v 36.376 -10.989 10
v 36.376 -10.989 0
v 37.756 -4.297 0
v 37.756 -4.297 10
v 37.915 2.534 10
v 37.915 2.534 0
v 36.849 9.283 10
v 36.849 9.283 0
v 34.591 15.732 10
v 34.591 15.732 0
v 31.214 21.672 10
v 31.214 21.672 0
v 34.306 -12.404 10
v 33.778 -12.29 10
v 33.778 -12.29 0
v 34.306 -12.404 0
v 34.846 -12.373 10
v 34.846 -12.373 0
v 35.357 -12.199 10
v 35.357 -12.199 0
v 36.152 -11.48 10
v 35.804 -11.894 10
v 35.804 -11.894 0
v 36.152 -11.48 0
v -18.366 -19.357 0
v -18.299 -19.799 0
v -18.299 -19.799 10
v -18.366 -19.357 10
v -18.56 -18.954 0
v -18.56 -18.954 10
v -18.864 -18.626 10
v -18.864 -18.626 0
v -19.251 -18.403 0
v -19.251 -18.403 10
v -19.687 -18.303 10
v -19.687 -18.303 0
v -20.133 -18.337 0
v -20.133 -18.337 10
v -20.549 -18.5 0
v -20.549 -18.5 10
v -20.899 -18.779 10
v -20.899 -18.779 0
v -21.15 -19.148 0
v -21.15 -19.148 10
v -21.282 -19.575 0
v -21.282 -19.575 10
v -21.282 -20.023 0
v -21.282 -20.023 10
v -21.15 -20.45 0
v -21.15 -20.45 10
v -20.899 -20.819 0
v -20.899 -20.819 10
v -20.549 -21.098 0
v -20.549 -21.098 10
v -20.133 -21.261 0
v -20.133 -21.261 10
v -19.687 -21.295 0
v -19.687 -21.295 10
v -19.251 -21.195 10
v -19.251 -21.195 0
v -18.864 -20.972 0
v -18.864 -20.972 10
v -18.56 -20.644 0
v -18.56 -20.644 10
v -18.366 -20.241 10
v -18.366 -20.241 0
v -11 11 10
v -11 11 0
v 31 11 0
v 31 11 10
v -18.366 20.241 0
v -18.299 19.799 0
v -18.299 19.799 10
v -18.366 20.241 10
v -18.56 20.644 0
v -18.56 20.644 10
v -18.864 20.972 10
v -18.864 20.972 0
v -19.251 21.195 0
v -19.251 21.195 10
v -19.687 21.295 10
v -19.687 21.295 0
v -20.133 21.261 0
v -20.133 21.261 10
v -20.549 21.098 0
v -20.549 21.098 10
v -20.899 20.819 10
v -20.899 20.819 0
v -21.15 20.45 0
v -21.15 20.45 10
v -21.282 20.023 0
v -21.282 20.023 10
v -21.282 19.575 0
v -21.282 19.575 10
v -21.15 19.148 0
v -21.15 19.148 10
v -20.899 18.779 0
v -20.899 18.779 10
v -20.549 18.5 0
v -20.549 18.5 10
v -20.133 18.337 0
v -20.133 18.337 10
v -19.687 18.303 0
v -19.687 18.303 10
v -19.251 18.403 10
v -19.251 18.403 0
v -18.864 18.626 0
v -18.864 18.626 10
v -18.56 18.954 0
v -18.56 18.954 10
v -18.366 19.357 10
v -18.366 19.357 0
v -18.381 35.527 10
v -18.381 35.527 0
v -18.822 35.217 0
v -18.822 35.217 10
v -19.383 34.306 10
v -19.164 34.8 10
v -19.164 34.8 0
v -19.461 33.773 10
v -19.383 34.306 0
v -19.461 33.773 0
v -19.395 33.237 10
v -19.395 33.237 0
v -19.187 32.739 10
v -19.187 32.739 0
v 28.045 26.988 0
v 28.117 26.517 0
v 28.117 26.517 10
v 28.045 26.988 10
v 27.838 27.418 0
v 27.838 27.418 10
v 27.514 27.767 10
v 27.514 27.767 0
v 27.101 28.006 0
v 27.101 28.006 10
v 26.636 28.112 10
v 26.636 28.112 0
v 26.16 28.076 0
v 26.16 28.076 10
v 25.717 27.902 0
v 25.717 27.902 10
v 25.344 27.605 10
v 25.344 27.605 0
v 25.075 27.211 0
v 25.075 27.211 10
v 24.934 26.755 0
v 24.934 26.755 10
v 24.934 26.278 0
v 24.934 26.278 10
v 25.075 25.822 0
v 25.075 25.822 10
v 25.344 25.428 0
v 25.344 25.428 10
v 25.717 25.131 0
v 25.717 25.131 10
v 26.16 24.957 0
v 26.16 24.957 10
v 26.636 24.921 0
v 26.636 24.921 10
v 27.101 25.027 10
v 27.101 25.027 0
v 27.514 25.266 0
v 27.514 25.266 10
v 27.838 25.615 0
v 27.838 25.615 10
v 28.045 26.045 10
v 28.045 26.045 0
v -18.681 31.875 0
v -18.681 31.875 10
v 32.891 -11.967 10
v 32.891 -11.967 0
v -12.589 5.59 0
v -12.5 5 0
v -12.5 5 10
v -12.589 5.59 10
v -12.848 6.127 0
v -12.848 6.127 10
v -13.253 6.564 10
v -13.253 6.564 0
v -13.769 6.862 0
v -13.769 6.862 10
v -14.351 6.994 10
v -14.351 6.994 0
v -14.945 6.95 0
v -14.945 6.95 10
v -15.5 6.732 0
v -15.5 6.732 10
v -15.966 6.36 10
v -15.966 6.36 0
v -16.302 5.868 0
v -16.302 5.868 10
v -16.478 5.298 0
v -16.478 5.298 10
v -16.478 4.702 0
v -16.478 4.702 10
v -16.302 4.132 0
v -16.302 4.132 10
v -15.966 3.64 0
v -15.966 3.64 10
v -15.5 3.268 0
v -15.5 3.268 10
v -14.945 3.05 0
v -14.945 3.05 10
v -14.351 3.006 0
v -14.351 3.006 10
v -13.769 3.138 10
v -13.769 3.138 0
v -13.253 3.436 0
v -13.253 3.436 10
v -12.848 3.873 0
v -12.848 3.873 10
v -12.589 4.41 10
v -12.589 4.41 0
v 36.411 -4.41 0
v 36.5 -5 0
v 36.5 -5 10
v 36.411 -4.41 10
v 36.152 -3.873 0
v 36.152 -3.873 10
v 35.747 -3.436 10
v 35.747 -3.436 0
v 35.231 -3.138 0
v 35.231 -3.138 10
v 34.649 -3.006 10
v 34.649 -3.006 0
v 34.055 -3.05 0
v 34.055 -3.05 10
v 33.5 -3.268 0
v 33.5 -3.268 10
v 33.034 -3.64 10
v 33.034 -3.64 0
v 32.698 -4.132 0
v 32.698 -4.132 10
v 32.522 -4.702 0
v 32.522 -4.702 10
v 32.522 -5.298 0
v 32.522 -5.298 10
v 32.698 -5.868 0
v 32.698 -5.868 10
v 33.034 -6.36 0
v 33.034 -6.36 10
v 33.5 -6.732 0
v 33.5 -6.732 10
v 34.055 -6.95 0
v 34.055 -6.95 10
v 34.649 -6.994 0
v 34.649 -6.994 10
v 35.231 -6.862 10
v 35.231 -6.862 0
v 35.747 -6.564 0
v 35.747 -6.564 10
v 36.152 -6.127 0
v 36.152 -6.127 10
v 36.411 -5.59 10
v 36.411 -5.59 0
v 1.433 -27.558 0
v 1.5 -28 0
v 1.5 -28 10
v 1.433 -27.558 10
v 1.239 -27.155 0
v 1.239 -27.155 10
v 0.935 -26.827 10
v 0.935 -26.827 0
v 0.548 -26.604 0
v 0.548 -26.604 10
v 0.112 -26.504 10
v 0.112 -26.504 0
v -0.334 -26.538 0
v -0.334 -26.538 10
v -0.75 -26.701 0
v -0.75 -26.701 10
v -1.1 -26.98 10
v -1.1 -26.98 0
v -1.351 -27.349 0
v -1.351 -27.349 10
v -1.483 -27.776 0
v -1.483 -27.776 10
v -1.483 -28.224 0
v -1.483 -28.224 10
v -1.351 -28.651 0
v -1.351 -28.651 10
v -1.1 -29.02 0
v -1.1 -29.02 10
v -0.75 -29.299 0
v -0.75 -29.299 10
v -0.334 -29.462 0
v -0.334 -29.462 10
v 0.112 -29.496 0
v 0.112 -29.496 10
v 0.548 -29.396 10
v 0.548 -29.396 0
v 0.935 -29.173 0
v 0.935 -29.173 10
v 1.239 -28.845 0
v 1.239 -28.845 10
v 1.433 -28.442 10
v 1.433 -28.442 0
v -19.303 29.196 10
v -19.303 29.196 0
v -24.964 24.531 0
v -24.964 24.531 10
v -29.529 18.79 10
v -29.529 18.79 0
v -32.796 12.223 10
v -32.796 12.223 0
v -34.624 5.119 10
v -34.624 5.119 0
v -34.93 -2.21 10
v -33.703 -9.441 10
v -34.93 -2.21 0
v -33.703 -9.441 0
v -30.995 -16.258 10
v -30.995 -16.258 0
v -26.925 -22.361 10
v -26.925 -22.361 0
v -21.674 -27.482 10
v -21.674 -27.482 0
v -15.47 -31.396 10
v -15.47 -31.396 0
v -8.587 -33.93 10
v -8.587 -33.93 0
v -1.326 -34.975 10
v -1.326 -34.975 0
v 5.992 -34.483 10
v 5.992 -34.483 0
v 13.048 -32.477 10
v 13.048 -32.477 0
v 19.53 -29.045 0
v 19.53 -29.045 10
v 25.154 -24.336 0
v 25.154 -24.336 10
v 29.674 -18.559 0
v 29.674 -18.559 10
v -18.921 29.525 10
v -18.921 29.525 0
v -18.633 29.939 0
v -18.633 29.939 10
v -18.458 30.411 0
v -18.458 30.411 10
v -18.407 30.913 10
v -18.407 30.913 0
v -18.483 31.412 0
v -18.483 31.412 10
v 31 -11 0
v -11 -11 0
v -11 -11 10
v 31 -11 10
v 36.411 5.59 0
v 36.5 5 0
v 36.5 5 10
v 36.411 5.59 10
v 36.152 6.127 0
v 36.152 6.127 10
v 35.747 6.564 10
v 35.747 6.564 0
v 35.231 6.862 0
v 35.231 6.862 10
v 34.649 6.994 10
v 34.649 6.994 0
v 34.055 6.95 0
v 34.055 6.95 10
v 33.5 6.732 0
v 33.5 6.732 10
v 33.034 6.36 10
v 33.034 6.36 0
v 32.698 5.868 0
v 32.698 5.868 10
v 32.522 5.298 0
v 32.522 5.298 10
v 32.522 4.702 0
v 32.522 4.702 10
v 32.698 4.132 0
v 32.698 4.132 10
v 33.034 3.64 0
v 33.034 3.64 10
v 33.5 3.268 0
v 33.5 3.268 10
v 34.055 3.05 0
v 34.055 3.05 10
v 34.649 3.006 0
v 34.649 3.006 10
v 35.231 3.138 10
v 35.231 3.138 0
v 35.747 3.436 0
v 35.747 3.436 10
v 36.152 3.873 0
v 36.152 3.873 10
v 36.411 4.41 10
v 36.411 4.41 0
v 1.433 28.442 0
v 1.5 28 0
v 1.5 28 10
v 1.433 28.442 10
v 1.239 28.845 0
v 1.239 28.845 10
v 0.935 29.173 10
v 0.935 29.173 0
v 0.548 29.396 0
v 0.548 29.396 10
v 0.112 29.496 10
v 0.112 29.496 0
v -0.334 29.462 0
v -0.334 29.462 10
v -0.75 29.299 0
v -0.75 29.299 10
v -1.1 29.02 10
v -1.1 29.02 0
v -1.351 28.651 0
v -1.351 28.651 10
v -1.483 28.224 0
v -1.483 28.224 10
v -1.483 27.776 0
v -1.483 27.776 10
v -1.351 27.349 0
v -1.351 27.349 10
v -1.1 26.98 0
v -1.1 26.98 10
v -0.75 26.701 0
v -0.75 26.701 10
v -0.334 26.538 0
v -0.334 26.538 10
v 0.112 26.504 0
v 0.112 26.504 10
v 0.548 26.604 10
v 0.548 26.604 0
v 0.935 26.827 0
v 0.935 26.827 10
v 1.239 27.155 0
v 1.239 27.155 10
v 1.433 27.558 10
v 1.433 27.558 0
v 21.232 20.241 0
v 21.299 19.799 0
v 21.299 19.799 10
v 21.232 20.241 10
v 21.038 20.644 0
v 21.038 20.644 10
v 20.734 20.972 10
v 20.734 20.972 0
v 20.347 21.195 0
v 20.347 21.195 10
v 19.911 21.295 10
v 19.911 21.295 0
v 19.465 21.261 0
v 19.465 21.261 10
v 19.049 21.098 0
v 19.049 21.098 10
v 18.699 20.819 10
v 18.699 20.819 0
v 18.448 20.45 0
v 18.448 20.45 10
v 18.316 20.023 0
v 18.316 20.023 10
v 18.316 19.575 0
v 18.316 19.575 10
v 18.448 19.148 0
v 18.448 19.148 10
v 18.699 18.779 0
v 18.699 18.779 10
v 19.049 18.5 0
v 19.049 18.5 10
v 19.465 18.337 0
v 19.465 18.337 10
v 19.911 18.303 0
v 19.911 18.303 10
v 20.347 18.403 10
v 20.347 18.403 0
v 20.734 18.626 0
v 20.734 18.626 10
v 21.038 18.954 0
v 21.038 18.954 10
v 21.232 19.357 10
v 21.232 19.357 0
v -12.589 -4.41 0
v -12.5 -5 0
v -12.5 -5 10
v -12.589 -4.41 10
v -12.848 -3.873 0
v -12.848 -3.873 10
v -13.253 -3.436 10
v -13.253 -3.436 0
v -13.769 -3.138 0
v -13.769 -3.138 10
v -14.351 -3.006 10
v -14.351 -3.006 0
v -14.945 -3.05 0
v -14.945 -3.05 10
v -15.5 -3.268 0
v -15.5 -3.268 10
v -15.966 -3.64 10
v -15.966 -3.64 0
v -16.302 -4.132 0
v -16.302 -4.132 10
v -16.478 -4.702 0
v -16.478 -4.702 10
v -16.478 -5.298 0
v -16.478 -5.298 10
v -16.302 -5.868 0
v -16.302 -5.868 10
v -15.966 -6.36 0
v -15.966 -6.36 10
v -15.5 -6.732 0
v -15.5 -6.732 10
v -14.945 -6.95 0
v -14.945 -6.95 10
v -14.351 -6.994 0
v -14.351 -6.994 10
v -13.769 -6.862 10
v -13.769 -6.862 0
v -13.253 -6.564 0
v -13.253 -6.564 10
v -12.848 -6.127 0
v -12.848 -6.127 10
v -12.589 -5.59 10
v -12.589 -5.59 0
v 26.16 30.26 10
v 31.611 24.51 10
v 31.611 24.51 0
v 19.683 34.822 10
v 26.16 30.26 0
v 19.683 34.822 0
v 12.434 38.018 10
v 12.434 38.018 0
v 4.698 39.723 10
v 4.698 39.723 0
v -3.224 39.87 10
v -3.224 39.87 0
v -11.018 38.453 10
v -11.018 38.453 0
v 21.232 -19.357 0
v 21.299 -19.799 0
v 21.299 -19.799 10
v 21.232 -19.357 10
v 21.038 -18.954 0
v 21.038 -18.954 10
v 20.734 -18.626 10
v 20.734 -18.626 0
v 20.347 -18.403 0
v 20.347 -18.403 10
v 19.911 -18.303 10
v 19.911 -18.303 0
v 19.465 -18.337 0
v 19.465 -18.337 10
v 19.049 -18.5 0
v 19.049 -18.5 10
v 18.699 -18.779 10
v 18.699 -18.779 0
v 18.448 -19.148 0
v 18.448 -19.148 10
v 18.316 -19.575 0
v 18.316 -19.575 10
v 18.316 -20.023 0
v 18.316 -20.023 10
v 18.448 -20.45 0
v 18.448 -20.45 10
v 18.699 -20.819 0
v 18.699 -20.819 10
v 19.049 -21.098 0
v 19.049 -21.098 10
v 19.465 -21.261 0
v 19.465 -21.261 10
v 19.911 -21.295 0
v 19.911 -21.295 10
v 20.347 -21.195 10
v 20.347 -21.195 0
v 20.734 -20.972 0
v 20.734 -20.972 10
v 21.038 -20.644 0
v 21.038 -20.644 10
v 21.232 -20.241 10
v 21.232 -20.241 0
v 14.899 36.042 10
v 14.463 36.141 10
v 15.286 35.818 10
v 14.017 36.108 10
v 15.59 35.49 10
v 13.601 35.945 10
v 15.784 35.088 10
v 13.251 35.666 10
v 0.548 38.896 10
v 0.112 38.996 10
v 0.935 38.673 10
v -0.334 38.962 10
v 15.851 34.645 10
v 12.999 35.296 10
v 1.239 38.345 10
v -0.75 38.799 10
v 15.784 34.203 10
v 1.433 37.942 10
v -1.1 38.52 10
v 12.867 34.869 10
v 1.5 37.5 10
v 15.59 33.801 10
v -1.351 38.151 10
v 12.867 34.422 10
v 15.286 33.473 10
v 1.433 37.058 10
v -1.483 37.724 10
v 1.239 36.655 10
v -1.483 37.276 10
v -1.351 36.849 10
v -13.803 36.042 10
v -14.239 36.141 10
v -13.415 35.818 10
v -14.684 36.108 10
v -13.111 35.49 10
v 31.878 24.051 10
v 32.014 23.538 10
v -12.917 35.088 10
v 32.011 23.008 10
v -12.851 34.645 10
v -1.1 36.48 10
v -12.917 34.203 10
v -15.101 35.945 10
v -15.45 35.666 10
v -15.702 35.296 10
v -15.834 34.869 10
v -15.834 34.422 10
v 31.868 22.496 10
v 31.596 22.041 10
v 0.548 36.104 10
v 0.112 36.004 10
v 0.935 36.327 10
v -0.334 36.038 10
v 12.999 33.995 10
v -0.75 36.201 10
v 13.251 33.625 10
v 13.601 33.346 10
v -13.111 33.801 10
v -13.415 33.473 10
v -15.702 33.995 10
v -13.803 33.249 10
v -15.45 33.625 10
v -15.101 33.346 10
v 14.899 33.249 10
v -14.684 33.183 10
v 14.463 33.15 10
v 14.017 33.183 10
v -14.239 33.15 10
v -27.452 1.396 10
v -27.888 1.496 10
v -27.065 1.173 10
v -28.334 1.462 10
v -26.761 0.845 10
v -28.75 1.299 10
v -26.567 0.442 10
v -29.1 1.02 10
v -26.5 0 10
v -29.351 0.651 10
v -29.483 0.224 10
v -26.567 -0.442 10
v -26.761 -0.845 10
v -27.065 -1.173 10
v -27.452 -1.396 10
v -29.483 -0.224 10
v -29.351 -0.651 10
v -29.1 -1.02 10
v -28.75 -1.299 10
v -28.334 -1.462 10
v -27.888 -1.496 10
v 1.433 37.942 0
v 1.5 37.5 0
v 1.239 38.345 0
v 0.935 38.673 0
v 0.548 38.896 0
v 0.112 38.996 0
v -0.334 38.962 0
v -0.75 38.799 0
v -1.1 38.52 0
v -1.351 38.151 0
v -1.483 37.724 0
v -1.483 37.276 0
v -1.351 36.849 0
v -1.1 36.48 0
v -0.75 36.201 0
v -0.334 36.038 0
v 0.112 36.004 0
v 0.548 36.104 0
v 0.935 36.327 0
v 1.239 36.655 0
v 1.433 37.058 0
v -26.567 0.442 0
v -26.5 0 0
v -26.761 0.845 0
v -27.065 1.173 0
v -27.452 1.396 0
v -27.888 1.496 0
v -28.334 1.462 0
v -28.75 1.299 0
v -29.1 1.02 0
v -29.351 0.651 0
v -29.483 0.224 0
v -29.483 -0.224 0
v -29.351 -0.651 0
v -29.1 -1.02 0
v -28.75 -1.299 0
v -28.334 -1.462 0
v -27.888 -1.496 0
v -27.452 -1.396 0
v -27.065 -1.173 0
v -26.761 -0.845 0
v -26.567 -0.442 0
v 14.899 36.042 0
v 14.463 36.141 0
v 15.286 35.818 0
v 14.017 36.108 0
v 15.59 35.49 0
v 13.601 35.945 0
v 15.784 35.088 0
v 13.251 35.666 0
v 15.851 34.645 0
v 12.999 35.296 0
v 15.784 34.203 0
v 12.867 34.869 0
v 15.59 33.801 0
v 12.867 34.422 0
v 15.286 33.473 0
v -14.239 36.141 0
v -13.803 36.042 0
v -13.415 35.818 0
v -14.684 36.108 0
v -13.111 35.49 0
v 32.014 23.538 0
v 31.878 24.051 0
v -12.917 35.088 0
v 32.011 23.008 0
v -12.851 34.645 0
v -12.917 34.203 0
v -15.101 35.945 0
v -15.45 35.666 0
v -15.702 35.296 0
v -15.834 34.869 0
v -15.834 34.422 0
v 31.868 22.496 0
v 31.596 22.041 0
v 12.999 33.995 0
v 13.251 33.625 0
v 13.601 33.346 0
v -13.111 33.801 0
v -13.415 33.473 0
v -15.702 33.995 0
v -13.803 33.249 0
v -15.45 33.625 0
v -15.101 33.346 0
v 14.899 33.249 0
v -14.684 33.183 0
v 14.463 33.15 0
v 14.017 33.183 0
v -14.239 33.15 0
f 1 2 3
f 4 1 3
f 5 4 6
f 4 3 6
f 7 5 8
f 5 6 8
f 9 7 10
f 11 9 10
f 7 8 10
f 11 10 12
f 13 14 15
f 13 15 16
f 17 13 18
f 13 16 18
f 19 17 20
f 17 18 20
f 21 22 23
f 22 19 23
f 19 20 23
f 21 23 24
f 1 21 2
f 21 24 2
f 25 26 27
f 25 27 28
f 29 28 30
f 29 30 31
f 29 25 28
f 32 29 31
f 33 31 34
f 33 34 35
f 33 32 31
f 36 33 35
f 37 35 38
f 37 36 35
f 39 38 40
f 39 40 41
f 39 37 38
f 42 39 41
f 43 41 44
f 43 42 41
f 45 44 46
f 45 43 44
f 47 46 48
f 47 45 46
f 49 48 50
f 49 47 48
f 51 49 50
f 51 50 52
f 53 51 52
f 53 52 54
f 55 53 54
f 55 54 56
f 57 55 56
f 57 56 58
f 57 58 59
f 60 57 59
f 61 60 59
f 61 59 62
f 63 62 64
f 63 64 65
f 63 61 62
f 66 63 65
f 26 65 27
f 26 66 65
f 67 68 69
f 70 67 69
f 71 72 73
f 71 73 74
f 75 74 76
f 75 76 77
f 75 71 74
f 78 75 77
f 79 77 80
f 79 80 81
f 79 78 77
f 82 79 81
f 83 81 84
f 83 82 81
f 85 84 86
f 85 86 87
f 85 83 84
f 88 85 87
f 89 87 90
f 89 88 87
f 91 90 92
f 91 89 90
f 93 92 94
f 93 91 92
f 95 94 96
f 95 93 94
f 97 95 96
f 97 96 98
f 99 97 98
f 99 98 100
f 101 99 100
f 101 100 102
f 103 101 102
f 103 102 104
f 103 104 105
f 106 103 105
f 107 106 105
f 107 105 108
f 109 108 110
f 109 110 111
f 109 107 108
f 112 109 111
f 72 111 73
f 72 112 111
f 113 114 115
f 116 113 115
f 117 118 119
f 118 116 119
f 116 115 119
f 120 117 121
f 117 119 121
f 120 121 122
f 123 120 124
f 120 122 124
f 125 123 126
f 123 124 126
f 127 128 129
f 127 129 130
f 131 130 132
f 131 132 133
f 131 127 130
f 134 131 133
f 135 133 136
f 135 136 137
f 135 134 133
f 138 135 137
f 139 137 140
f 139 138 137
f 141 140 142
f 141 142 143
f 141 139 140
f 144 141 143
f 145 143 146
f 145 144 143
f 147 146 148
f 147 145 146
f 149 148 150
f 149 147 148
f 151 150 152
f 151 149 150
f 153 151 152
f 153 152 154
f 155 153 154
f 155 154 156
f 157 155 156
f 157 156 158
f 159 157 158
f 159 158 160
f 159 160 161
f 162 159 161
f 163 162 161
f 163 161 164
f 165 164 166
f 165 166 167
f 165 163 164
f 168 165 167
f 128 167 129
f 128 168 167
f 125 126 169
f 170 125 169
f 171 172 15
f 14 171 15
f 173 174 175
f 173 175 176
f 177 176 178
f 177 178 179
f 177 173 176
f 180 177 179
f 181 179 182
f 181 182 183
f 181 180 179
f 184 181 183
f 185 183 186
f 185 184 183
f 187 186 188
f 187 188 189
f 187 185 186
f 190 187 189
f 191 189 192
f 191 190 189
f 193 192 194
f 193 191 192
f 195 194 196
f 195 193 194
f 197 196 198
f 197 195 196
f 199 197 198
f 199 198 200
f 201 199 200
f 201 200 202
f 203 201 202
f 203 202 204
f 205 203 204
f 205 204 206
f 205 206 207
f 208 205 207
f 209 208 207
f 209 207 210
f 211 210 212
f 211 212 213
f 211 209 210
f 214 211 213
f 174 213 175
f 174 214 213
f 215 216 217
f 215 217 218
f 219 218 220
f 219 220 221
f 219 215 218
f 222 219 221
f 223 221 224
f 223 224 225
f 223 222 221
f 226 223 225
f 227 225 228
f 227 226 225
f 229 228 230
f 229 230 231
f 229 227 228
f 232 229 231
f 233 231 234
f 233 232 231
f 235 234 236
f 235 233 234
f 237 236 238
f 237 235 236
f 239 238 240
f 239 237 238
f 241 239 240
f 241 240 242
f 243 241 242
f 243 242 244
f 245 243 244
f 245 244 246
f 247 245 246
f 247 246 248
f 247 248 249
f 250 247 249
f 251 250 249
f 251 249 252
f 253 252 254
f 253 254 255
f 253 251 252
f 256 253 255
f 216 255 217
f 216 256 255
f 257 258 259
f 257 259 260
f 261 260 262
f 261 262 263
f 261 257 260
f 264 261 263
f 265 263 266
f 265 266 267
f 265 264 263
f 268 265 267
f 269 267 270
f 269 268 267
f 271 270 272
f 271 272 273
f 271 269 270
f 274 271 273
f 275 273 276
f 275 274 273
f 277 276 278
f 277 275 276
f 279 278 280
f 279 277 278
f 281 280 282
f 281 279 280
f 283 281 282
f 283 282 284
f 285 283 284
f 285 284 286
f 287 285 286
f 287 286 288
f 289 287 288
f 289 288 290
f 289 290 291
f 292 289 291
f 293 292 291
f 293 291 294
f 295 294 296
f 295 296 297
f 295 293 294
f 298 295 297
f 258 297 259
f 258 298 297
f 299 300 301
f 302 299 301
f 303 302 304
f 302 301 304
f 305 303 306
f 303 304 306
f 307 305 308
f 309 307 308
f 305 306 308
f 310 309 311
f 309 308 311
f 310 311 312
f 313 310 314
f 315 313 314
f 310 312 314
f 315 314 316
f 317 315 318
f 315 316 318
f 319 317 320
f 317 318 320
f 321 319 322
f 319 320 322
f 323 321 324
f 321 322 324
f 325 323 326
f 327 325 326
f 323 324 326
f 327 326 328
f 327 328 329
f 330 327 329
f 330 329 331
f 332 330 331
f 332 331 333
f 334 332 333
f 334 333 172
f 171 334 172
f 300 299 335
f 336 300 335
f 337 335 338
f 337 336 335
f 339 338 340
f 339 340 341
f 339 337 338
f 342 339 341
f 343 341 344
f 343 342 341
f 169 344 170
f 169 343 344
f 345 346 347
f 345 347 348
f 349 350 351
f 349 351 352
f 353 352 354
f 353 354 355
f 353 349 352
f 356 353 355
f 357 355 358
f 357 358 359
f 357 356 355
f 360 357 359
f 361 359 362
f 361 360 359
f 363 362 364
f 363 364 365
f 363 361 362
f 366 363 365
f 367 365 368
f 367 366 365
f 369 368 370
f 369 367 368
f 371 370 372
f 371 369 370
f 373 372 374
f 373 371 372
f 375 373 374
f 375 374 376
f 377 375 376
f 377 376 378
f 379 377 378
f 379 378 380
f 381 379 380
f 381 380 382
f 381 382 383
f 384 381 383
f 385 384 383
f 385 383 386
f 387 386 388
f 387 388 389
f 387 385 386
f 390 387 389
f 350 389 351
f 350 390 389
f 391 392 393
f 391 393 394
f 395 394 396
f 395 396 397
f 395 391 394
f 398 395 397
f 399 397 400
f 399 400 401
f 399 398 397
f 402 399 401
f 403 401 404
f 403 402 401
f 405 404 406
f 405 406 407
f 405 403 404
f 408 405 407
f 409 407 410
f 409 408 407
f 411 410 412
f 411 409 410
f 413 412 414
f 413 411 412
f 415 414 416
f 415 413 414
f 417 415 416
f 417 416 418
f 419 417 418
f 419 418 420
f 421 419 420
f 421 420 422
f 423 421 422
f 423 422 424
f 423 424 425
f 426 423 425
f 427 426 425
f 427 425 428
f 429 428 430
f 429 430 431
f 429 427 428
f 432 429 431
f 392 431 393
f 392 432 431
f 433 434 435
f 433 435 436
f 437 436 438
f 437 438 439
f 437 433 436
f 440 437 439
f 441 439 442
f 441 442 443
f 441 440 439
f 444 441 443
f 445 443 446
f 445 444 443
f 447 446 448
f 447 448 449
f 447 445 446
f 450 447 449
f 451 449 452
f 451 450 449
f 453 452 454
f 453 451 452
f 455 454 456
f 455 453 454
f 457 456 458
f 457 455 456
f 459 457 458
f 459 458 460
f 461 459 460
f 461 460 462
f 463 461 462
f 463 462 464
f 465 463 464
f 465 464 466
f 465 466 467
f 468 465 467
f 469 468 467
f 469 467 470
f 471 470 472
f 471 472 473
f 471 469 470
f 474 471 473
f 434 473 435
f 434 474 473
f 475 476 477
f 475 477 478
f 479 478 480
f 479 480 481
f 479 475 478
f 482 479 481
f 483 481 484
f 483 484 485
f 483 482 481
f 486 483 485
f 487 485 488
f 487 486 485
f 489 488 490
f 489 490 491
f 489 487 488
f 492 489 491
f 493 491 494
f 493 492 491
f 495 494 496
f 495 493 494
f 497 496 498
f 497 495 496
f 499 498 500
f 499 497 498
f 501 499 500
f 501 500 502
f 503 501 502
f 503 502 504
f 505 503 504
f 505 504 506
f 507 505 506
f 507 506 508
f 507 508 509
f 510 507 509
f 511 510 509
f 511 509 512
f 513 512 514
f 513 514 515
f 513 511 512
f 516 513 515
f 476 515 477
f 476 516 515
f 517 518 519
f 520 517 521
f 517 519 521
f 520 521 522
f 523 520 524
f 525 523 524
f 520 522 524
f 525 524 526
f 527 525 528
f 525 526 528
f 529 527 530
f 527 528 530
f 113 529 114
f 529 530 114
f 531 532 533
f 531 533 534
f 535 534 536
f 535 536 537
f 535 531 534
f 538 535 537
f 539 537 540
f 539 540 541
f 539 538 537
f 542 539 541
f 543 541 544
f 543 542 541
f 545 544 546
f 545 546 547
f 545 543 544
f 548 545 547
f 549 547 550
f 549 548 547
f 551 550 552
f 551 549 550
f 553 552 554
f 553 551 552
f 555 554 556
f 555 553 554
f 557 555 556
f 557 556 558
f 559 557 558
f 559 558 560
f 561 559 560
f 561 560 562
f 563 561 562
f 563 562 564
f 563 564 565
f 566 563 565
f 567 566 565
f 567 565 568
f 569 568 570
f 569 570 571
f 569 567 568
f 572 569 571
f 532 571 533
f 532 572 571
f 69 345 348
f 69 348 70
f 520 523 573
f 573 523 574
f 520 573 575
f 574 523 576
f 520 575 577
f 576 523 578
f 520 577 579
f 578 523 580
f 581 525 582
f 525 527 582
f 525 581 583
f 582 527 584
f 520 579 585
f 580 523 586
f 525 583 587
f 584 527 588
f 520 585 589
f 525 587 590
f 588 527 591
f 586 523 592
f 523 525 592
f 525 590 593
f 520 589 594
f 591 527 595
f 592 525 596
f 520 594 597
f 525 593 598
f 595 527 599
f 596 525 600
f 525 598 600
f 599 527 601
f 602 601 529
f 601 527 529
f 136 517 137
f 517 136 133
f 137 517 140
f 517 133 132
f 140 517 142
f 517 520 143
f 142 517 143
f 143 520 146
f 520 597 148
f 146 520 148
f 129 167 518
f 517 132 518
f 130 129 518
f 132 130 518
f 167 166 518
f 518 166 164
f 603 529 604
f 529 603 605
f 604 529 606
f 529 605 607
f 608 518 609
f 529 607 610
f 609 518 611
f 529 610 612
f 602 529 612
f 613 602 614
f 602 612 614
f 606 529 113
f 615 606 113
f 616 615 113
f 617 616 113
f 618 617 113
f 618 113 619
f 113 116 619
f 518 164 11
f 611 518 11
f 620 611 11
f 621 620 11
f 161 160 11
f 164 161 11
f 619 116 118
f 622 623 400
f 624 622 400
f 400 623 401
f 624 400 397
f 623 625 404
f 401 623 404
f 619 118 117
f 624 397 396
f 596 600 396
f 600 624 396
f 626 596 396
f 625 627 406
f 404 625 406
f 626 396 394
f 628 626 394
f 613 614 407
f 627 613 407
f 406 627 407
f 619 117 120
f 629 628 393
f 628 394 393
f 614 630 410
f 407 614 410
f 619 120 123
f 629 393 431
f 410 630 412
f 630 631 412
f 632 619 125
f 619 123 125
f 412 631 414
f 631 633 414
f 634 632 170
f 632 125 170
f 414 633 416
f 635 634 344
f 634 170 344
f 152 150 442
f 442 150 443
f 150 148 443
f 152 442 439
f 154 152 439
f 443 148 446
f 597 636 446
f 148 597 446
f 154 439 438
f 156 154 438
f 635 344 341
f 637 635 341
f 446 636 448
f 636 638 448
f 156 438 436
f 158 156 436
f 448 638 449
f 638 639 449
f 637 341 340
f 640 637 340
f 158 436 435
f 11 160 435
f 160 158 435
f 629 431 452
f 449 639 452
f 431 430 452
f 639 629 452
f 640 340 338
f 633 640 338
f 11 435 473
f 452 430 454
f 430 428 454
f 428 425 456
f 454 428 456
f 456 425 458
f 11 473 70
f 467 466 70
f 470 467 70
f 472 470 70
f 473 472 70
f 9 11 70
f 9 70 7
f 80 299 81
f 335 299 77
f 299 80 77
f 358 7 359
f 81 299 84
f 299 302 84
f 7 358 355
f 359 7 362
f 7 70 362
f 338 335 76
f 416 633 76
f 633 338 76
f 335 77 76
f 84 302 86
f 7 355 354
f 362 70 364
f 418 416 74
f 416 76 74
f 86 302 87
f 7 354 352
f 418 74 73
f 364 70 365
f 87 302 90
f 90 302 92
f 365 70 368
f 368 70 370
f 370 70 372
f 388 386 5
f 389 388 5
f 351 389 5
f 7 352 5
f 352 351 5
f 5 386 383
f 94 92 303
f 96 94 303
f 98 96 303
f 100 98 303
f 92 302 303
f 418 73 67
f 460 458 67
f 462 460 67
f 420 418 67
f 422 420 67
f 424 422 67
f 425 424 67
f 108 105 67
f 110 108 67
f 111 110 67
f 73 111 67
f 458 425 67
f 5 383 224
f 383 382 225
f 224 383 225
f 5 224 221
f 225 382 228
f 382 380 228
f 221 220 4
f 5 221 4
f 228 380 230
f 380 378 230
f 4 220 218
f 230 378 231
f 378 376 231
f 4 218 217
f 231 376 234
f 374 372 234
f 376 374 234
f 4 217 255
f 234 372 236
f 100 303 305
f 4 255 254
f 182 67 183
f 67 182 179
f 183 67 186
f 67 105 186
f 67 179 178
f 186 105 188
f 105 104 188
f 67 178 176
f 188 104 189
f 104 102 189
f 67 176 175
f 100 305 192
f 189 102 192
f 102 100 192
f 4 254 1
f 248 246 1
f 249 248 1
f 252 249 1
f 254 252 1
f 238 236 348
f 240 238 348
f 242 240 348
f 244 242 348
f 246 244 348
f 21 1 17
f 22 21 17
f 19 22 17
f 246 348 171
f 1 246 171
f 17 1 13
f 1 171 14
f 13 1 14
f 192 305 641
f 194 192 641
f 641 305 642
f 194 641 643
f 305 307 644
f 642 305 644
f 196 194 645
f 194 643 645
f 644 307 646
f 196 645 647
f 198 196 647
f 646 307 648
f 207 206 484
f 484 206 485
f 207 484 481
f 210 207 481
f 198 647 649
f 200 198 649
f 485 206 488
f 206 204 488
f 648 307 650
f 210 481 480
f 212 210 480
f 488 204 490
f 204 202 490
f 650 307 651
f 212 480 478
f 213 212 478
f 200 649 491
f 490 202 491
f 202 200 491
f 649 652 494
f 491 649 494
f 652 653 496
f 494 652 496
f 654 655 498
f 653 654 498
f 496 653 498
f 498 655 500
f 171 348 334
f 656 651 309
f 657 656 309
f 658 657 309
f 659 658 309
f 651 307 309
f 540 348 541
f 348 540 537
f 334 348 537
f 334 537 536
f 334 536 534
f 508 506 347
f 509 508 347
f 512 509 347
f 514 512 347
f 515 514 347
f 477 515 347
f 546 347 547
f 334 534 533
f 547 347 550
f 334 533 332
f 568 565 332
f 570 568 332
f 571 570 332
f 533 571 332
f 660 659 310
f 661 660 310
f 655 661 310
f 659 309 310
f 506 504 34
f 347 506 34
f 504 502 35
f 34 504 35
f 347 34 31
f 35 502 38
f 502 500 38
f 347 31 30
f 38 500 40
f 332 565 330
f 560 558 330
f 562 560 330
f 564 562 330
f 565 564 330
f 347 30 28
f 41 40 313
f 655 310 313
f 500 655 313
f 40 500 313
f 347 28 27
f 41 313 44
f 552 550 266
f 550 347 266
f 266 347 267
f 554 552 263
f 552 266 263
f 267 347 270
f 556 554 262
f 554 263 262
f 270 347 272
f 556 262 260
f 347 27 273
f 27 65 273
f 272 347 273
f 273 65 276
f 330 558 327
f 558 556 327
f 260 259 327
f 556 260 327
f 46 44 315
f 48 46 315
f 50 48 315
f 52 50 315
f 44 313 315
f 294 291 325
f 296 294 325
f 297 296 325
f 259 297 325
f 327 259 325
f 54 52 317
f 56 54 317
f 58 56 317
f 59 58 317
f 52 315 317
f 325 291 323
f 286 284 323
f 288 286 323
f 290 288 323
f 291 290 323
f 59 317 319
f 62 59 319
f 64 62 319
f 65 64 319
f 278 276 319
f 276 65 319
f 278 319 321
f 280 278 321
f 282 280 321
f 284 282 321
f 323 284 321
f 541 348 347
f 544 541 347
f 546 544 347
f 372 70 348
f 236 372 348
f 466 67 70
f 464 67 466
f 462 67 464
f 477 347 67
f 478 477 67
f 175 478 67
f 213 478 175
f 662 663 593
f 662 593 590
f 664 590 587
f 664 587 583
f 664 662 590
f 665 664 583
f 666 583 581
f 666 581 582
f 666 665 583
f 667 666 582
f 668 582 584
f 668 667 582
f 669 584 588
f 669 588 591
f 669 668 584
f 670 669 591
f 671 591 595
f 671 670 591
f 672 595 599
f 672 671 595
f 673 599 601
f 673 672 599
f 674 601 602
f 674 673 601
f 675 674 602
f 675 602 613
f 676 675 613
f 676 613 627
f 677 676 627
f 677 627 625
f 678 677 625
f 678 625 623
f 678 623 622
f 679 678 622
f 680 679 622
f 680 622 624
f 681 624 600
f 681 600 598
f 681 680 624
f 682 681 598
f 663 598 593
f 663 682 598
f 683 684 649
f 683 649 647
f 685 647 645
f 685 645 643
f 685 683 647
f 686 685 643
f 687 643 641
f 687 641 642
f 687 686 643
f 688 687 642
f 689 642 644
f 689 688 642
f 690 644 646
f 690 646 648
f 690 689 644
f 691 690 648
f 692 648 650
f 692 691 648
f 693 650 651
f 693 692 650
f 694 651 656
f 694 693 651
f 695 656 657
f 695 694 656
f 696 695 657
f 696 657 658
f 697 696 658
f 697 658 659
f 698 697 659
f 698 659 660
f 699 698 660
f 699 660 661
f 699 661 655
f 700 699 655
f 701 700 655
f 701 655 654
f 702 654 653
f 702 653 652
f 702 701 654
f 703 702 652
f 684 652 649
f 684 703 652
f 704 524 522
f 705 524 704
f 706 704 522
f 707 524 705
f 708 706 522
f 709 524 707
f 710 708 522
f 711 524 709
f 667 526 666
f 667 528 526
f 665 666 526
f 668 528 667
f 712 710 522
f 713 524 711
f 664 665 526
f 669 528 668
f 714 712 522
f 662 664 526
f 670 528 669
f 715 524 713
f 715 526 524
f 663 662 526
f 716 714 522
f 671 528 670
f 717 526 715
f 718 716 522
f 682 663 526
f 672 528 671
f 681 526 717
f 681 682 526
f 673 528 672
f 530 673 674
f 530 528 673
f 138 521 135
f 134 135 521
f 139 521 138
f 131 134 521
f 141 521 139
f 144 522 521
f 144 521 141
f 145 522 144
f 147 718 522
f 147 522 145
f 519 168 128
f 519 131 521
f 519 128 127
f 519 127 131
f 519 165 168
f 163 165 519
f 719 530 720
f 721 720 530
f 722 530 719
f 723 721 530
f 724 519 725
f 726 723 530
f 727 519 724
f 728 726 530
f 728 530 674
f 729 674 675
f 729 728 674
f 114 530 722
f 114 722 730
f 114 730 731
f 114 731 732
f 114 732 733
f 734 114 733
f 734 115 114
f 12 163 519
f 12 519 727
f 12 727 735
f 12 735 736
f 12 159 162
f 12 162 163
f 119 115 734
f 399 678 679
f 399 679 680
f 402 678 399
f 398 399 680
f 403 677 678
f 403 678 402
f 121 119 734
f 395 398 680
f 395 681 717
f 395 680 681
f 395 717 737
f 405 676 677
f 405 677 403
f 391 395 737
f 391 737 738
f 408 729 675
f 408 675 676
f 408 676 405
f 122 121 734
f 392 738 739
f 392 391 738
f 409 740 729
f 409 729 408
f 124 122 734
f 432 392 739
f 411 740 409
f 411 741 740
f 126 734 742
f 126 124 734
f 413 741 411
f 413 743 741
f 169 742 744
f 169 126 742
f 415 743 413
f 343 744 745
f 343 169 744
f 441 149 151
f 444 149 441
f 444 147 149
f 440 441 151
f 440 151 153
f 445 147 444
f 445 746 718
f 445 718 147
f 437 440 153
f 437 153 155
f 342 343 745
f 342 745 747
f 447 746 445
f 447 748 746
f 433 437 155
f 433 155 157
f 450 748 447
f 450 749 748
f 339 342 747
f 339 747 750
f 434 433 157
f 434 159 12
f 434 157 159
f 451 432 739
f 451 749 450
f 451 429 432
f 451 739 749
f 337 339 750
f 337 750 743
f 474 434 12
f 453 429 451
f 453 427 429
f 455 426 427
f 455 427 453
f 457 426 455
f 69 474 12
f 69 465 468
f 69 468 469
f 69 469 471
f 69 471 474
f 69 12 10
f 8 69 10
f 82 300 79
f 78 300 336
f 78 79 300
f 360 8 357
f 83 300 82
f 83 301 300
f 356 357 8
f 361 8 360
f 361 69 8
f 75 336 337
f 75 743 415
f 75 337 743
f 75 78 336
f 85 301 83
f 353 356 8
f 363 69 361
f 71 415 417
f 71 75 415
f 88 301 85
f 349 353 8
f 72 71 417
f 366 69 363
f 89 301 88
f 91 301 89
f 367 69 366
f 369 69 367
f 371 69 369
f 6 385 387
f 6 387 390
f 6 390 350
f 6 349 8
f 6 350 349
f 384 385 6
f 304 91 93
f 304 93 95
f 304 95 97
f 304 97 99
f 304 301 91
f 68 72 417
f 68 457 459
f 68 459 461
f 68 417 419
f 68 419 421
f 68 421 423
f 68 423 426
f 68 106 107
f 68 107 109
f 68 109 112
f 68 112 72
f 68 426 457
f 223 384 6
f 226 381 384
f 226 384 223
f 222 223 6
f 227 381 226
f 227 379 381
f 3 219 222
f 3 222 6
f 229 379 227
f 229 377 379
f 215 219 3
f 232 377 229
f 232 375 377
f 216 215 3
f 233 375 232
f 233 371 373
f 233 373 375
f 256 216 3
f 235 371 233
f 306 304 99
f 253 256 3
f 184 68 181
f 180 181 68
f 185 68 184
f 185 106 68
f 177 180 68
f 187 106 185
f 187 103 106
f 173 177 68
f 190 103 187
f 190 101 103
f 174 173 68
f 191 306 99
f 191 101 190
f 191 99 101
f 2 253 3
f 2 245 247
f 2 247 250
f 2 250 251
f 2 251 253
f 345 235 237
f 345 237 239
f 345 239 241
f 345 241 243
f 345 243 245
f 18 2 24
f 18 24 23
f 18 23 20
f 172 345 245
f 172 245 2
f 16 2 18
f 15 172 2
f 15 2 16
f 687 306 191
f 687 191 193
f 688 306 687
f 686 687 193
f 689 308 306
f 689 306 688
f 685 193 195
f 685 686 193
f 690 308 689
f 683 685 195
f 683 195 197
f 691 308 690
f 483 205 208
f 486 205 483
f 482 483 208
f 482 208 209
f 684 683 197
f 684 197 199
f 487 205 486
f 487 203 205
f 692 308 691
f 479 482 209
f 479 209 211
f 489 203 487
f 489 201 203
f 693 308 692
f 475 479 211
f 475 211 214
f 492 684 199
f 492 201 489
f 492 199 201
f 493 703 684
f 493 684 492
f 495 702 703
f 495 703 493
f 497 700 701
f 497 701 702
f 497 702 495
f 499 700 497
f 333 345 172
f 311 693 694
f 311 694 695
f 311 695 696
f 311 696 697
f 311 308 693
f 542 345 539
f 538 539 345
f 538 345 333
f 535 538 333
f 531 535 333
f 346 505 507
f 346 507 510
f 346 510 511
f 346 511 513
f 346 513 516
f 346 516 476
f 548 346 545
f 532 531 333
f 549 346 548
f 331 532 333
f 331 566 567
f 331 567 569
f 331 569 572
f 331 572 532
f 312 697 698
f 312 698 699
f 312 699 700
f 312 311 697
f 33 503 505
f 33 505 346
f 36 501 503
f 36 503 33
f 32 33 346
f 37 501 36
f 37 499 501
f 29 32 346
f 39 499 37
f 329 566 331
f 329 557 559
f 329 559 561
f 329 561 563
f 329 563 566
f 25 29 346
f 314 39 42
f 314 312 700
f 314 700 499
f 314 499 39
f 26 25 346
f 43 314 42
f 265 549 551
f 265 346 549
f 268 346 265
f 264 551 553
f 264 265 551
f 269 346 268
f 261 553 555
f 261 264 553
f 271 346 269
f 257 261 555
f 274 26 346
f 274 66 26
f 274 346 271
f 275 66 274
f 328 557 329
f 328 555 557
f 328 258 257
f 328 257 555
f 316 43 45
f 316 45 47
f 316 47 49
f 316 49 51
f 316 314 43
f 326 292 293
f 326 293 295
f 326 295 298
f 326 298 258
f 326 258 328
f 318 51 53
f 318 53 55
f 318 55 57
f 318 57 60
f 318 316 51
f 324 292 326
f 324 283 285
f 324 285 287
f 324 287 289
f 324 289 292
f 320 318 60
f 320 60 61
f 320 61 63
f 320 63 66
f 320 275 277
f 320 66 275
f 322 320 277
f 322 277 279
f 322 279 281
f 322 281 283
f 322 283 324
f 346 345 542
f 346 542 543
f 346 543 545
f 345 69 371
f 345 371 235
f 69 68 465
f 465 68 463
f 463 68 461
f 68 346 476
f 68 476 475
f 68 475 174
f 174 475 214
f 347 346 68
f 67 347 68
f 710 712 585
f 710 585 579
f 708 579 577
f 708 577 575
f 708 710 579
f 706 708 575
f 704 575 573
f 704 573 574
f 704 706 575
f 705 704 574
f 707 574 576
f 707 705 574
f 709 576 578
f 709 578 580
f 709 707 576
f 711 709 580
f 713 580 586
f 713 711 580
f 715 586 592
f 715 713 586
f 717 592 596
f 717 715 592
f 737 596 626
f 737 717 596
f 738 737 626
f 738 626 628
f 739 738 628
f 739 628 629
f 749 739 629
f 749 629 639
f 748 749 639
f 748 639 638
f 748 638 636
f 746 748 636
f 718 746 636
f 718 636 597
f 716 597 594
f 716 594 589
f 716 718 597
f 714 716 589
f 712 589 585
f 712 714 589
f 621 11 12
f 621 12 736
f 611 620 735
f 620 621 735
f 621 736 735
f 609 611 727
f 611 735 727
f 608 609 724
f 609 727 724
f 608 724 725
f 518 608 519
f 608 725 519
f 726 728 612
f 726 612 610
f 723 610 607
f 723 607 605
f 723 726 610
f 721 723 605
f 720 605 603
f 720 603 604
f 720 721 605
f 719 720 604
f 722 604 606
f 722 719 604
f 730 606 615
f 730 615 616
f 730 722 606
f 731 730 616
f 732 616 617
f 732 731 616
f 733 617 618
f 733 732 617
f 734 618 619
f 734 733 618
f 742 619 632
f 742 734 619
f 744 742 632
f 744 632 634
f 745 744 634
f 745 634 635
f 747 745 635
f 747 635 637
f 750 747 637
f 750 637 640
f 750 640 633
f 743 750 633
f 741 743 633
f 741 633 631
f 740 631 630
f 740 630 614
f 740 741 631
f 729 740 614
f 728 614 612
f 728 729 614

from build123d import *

# Parameters (mm, degrees)
SKETCH_2_R      = 1.5
SKETCH_2_R_2    = 2
SKETCH_2_W      = 42
SKETCH_2_H      = 22
SKETCH_2_R_3    = 1.6
EXTRUDE_2_DEPTH = 10
FILLET_1_R      = 2


with BuildPart() as part:
    # 草图2 → 凸台-拉伸2 (new body)
    with BuildSketch(Plane.XY):
        with BuildLine():
            ThreePointArc((35.709805767, -12.992681481), (37.684421913, 4.88716125), (31.214285714, 21.671833502))
            Line((31.214285714, 21.671833502), (32.857142857, 22.812456318))
            ThreePointArc((32.857142857, 22.812456318), (8.608258655, 39.062742901), (-20.224954765, 34.510160892))
            Line((-20.224954765, 34.510160892), (-17.696835419, 30.19639078))
            ThreePointArc((-17.696835419, 30.19639078), (-22.408690047, -26.885881246), (32.890610575, -11.96694347))
            Line((32.890610575, -11.96694347), (35.709805767, -12.992681481))
        make_face()
        with Locations((-19.798989873, -19.798989873)):
            Circle(SKETCH_2_R, mode=Mode.SUBTRACT)
        with Locations((0, -28)):
            Circle(SKETCH_2_R, mode=Mode.SUBTRACT)
        with Locations((-14.5, -5)):
            Circle(SKETCH_2_R_2, mode=Mode.SUBTRACT)
        with Locations((-28, 0)):
            Circle(SKETCH_2_R, mode=Mode.SUBTRACT)
        with Locations((19.798989873, -19.798989873)):
            Circle(SKETCH_2_R, mode=Mode.SUBTRACT)
        with Locations((10, 0)):
            Rectangle(SKETCH_2_W, SKETCH_2_H, mode=Mode.SUBTRACT)
        with Locations((34.5, -5)):
            Circle(SKETCH_2_R_2, mode=Mode.SUBTRACT)
        with Locations((-14.5, 5)):
            Circle(SKETCH_2_R_2, mode=Mode.SUBTRACT)
        with Locations((-19.798989873, 19.798989873)):
            Circle(SKETCH_2_R, mode=Mode.SUBTRACT)
        with Locations((0, 28)):
            Circle(SKETCH_2_R, mode=Mode.SUBTRACT)
        with Locations((19.798989873, 19.798989873)):
            Circle(SKETCH_2_R, mode=Mode.SUBTRACT)
        with Locations((34.5, 5)):
            Circle(SKETCH_2_R_2, mode=Mode.SUBTRACT)
        with Locations((26.516504294, 26.516504294)):
            Circle(SKETCH_2_R_3, mode=Mode.SUBTRACT)
        with Locations((14.350628714, 34.645482469)):
            Circle(SKETCH_2_R, mode=Mode.SUBTRACT)
        with Locations((0, 37.5)):
            Circle(SKETCH_2_R, mode=Mode.SUBTRACT)
        with Locations((-14.350628714, 34.645482469)):
            Circle(SKETCH_2_R, mode=Mode.SUBTRACT)
    extrude(amount=EXTRUDE_2_DEPTH)

    # 圆角1
    # the kernel refuses this fillet: 2 mm, written as the material it adds along each edge
    with BuildSketch(Plane(origin=(-17.696835419, 30.19639078, 0), x_dir=(-0.5056238691162223, 0.862754022291372, 0), z_dir=(0, 0, 1))) as fillet_1_piece_1:
        with BuildLine():
            CenterArc((1.945906404, 2), FILLET_1_R, 183.09857934, 86.90142066)
            ThreePointArc((-0.051169618, 1.891891892), (-0.012794743, 0.946291876), (0, 0))
            Line((0, 0), (1.945906404, 0))
        make_face()
    extrude(amount=10)
    # the kernel refuses this fillet: 2 mm, written as the material it takes off along each edge
    with BuildSketch(Plane(origin=(35.709805767, -12.992681481, -5.279816712), x_dir=(0.3156668887072375, 0.9488700729677867, 0), z_dir=(0, 0, 1))) as fillet_1_2_piece_1:
        with BuildLine():
            CenterArc((2.056349667, 1.99922765), FILLET_1_R, 178.407630732, 93.184738537)
            Line((0.057122017, 2.054804668), (0, 0))
            ThreePointArc((0, 0), (1.055963342, -0.014674657), (2.111926685, 0))
        make_face()
    extrude(amount=20.559633424, mode=Mode.SUBTRACT)
    with BuildSketch(Plane(origin=(32.857142857, 22.812456318, -5.26498253), x_dir=(-0.8214285714285717, -0.5703114079525466, 0), z_dir=(0, 0, 1))) as fillet_1_2_piece_2_section:
        with BuildLine():
            CenterArc((2.052668078, -2), FILLET_1_R, 90, 93.01696131)
            ThreePointArc((0.055440082, -2.105263158), (0.013862423, -1.052996506), (0, 0))
            Line((0, 0), (2.052668078, 0))
        make_face()
    fillet_1_2_piece_2 = extrude(amount=20.52996506, mode=Mode.PRIVATE)
    fillet_1_2_piece_2 = fillet_1_2_piece_2 - Plane(origin=(0, 0, 5), x_dir=(0.9397317307134324, -0.3419126705612664, 0), z_dir=(0, 0, -1)) * Cylinder(38, 50, mode=Mode.PRIVATE)
    add(fillet_1_2_piece_2, mode=Mode.SUBTRACT)
    with BuildSketch(Plane(origin=(-20.224954765, 34.510160892, -5.26498253), x_dir=(0.8757655299583756, 0.48273671554660663, 0), z_dir=(0, 0, 1))) as fillet_1_2_piece_3:
        with BuildLine():
            CenterArc((2.053343187, -1.999306879), FILLET_1_R, 88.491519345, 93.01696131)
            Line((0.054036308, -2.051956704), (0, 0))
            ThreePointArc((0, 0), (1.052996506, 0.013862423), (2.105993012, 0))
        make_face()
    extrude(amount=20.52996506, mode=Mode.SUBTRACT)


solid = part.part
